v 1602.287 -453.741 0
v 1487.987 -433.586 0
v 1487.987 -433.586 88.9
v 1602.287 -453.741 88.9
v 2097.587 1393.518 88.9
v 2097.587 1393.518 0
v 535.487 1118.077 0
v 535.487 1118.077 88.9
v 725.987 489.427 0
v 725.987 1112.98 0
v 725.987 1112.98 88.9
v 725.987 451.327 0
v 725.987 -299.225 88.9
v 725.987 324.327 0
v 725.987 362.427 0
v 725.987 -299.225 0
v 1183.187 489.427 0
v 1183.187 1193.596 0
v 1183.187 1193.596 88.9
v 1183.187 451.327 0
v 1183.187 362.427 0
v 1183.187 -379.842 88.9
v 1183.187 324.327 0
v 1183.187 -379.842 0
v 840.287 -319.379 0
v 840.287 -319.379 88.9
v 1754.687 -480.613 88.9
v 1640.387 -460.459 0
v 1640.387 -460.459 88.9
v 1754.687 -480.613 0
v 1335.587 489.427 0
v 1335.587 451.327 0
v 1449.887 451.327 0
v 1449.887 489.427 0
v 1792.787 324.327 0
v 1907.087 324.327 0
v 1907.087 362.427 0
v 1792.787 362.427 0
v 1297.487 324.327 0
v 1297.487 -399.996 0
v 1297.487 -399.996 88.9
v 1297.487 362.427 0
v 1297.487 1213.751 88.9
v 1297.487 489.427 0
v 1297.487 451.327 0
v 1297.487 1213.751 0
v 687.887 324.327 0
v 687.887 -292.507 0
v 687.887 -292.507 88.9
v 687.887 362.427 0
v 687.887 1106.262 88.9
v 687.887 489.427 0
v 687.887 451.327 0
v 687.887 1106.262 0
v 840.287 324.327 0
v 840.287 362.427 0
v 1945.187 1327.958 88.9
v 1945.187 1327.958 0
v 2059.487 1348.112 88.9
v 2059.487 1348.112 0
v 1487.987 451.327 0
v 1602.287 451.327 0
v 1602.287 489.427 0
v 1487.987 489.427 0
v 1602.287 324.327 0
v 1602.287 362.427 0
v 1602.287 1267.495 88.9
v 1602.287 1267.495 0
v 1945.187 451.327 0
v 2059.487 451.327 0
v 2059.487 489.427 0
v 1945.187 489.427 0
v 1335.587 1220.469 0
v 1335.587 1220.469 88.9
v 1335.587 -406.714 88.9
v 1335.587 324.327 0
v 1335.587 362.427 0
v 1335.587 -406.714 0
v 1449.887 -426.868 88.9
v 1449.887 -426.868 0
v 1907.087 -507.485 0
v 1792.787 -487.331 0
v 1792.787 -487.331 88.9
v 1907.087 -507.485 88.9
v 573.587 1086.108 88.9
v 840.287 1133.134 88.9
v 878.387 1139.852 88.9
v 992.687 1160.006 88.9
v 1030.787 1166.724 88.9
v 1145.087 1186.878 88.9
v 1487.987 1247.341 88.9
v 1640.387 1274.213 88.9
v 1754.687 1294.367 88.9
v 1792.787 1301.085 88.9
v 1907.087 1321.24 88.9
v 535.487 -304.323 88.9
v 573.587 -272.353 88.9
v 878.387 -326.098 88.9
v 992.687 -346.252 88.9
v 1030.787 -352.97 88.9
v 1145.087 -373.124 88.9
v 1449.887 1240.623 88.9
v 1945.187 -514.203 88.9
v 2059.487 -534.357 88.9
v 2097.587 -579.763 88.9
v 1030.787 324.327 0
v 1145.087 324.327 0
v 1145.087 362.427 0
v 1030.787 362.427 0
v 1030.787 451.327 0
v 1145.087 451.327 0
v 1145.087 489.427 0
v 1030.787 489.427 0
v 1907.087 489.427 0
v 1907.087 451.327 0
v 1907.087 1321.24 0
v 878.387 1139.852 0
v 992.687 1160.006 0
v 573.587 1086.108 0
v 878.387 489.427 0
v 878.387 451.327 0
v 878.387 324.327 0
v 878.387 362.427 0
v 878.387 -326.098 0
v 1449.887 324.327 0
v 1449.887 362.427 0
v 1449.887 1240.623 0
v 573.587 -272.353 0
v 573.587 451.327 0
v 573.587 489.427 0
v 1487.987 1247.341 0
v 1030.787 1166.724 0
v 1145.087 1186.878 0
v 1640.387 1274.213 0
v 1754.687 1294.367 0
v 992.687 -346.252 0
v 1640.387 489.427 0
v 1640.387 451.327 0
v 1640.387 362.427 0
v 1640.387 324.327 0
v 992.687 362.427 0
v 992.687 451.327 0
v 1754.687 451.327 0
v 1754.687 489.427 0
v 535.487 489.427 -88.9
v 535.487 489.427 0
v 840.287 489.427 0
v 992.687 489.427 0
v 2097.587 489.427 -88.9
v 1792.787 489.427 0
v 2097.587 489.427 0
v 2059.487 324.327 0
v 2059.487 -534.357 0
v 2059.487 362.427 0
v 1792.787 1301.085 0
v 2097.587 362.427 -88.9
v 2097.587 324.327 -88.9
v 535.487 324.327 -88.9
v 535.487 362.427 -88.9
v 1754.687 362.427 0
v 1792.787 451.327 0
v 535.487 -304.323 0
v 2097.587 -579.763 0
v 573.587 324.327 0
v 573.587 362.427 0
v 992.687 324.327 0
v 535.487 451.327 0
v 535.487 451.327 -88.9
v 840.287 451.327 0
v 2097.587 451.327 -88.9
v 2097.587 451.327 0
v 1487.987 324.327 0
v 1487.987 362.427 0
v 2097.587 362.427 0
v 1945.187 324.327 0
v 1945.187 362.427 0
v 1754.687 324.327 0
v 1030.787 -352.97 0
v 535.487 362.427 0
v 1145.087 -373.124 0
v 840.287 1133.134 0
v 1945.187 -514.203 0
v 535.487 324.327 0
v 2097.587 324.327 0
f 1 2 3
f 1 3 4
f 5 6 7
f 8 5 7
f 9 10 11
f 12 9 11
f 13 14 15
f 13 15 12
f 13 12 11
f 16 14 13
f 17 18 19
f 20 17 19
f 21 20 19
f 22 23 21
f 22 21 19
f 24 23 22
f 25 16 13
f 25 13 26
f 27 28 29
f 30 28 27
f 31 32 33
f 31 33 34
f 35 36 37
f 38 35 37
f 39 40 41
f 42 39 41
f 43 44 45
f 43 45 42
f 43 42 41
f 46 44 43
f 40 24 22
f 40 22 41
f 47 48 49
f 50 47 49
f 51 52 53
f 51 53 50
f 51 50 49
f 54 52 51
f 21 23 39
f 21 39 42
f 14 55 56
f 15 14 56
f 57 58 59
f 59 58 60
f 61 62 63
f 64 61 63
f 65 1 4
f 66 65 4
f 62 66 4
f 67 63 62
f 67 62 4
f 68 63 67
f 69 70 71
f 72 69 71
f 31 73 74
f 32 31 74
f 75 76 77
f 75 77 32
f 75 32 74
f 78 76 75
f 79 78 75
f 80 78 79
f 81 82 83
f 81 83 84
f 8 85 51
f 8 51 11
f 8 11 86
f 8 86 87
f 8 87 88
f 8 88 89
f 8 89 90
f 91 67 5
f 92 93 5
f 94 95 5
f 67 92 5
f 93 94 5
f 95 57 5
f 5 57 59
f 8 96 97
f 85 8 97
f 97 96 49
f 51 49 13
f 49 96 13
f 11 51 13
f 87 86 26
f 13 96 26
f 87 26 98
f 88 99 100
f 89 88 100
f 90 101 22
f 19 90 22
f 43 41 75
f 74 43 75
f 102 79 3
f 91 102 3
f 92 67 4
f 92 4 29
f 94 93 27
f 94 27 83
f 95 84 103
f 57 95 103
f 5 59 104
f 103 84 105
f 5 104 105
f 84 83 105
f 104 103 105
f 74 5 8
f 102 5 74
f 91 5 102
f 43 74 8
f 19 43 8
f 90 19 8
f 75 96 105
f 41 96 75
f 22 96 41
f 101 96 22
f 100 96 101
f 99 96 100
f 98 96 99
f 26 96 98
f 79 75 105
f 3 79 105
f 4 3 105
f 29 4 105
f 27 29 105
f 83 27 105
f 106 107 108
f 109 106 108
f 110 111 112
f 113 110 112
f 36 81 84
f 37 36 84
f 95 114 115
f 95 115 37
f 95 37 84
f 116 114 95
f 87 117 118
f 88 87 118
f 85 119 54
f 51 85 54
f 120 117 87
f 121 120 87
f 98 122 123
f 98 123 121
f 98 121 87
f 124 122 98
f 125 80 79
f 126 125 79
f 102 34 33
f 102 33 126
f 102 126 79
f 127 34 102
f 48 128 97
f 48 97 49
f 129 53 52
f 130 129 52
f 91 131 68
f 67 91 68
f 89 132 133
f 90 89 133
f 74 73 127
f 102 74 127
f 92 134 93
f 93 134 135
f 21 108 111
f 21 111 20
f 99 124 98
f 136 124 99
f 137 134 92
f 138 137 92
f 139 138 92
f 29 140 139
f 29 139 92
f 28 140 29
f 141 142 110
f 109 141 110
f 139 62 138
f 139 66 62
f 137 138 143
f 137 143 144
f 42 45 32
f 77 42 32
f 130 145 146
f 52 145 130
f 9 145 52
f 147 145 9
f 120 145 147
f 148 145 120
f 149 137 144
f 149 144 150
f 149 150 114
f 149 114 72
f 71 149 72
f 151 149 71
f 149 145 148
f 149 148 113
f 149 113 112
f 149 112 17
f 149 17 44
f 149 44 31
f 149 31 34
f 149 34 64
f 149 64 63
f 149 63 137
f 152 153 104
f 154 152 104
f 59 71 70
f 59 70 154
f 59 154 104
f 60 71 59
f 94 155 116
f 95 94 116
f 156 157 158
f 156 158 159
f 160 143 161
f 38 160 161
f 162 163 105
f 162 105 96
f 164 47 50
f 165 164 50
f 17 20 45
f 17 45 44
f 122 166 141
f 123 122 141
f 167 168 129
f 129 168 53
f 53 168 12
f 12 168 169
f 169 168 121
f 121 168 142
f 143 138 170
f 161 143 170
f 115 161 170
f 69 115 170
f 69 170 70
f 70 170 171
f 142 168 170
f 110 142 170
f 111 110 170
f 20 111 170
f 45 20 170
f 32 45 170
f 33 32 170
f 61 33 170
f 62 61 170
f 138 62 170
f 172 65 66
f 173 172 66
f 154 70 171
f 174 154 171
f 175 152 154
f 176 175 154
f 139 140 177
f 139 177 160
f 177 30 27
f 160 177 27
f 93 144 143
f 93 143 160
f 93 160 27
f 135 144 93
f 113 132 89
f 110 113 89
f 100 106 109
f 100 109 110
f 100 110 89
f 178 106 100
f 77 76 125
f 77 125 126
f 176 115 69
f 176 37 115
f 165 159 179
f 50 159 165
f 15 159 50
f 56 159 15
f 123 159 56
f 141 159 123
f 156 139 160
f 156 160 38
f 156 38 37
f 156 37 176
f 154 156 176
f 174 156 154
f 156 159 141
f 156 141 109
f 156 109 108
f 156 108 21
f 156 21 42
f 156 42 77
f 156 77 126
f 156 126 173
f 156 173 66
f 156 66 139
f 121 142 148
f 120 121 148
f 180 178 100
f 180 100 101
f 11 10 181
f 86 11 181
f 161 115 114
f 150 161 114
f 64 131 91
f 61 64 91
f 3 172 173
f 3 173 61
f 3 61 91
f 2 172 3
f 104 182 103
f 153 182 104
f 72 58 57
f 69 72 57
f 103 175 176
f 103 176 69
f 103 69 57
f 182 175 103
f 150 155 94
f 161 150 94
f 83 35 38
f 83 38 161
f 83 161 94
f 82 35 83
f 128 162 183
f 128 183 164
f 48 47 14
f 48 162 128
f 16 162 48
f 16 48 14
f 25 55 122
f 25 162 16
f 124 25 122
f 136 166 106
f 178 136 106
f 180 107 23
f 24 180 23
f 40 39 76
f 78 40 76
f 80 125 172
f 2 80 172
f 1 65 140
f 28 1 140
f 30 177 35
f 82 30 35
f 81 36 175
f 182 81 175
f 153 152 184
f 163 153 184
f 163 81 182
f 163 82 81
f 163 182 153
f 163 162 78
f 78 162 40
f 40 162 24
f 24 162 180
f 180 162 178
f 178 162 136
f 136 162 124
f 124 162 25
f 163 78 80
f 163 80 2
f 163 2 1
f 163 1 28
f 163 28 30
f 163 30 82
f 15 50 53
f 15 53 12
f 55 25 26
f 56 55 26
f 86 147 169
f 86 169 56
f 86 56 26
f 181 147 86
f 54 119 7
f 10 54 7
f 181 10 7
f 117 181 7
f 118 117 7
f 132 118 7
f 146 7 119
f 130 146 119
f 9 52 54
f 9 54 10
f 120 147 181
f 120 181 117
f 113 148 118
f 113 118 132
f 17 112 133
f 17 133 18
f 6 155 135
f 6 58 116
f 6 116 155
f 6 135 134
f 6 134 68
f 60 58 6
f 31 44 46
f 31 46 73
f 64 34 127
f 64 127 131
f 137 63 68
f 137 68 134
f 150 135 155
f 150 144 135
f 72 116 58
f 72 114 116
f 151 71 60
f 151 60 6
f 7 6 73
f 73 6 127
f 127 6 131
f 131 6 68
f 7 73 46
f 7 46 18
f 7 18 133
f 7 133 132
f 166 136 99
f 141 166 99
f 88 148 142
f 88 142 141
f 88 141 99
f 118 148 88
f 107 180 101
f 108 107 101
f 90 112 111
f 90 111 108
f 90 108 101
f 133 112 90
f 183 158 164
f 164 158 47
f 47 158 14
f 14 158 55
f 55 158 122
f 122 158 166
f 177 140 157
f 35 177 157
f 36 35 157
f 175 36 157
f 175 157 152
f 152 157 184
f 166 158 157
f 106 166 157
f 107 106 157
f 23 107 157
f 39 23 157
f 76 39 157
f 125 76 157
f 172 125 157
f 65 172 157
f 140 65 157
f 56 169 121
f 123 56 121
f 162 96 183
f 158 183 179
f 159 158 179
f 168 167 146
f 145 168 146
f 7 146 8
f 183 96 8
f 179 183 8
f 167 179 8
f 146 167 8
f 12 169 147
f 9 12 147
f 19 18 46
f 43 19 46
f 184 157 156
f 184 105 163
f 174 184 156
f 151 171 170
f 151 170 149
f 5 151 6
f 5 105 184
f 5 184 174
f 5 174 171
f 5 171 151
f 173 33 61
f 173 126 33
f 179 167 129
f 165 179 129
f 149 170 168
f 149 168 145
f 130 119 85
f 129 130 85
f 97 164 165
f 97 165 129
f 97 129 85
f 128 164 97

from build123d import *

# Parameters (mm, degrees)
F1_DEPTH = 88.9
F3_W     = 38.1
F3_H     = 88.9
F4_DEPTH = 1562.1


# Not quite as in the source:
# - a feature names something its author has since deleted; it is built from what else it names


with BuildPart() as f1:
    # F0 (on Top) → F1 (new body)
    with BuildSketch(Plane.XY):
        Polygon((535.4871858596, 1118.0772274703), (535.4871858596, 1079.3894735575), (535.4871858596, 406.8772274703), (573.5871858596, 406.8772274703), (573.5871858596, 1086.1075315225), (687.8871858596, 1106.2617054174), (687.8871858597, 406.8772274703), (725.9871858597, 406.8772274703), (725.9871858596, 1112.9797633824), (840.2871858596, 1133.1339372774), (840.2871858596, 406.8772274703), (878.3871858596, 406.8772274703), (878.3871858596, 1139.8519952424), (992.6871858596, 1160.0061691374), (992.6871858596, 406.8772274703), (1030.7871858596, 406.8772274703), (1030.7871858596, 1166.7242271024), (1145.0871858596, 1186.8784009974), (1145.0871858596, 406.8772274703), (1183.1871858596, 406.8772274703), (1183.1871858596, 1193.5964589624), (1297.4871858596, 1213.7506328574), (1297.4871858596, 406.8772274703), (1335.5871858596, 406.8772274703), (1335.5871858596, 1220.4686908224), (1449.8871858596, 1240.6228647173), (1449.8871858596, 406.8772274703), (1487.9871858596, 406.8772274703), (1487.9871858596, 1247.3409226823), (1602.2871858596, 1267.4950965773), (1602.2871858596, 406.8772274703), (1640.3871858596, 406.8772274703), (1640.3871858596, 1274.2131545423), (1754.6871858596, 1294.3673284373), (1754.6871858596, 406.8772274703), (1792.7871858596, 406.8772274703), (1792.7871858596, 1301.0853864023), (1907.0871858596, 1321.2395602973), (1907.0871858596, 406.8772274703), (1945.1871858596, 406.8772274703), (1945.1871858596, 1327.9576182623), (2059.4871858596, 1348.1117921573), (2059.4871858596, 406.8772274703), (2097.5871858597, 406.8772274703), (2097.5871858596, 1354.8298501222), (2097.5871858596, 1393.5176040351), align=None)
    extrude(amount=F1_DEPTH)

    # F2: F1 across face


with BuildPart() as f1_1:
    add(f1.part)
    add(f1.part.mirror(Plane(origin=(554.5371858596, 406.8772274703, 44.45), x_dir=(1, 0, 0), z_dir=(0, -1, 0))))

    # F3 (on face) → F4 (join, through all)
    with BuildSketch(Plane.YZ.offset(2097.5871858597)):
        with Locations((343.3772274703, -44.45)):
            Rectangle(F3_W, F3_H)
        with Locations((470.3772274703, -44.45)):
            Rectangle(F3_W, F3_H)
    extrude(amount=-F4_DEPTH)


solid = f1_1.part
